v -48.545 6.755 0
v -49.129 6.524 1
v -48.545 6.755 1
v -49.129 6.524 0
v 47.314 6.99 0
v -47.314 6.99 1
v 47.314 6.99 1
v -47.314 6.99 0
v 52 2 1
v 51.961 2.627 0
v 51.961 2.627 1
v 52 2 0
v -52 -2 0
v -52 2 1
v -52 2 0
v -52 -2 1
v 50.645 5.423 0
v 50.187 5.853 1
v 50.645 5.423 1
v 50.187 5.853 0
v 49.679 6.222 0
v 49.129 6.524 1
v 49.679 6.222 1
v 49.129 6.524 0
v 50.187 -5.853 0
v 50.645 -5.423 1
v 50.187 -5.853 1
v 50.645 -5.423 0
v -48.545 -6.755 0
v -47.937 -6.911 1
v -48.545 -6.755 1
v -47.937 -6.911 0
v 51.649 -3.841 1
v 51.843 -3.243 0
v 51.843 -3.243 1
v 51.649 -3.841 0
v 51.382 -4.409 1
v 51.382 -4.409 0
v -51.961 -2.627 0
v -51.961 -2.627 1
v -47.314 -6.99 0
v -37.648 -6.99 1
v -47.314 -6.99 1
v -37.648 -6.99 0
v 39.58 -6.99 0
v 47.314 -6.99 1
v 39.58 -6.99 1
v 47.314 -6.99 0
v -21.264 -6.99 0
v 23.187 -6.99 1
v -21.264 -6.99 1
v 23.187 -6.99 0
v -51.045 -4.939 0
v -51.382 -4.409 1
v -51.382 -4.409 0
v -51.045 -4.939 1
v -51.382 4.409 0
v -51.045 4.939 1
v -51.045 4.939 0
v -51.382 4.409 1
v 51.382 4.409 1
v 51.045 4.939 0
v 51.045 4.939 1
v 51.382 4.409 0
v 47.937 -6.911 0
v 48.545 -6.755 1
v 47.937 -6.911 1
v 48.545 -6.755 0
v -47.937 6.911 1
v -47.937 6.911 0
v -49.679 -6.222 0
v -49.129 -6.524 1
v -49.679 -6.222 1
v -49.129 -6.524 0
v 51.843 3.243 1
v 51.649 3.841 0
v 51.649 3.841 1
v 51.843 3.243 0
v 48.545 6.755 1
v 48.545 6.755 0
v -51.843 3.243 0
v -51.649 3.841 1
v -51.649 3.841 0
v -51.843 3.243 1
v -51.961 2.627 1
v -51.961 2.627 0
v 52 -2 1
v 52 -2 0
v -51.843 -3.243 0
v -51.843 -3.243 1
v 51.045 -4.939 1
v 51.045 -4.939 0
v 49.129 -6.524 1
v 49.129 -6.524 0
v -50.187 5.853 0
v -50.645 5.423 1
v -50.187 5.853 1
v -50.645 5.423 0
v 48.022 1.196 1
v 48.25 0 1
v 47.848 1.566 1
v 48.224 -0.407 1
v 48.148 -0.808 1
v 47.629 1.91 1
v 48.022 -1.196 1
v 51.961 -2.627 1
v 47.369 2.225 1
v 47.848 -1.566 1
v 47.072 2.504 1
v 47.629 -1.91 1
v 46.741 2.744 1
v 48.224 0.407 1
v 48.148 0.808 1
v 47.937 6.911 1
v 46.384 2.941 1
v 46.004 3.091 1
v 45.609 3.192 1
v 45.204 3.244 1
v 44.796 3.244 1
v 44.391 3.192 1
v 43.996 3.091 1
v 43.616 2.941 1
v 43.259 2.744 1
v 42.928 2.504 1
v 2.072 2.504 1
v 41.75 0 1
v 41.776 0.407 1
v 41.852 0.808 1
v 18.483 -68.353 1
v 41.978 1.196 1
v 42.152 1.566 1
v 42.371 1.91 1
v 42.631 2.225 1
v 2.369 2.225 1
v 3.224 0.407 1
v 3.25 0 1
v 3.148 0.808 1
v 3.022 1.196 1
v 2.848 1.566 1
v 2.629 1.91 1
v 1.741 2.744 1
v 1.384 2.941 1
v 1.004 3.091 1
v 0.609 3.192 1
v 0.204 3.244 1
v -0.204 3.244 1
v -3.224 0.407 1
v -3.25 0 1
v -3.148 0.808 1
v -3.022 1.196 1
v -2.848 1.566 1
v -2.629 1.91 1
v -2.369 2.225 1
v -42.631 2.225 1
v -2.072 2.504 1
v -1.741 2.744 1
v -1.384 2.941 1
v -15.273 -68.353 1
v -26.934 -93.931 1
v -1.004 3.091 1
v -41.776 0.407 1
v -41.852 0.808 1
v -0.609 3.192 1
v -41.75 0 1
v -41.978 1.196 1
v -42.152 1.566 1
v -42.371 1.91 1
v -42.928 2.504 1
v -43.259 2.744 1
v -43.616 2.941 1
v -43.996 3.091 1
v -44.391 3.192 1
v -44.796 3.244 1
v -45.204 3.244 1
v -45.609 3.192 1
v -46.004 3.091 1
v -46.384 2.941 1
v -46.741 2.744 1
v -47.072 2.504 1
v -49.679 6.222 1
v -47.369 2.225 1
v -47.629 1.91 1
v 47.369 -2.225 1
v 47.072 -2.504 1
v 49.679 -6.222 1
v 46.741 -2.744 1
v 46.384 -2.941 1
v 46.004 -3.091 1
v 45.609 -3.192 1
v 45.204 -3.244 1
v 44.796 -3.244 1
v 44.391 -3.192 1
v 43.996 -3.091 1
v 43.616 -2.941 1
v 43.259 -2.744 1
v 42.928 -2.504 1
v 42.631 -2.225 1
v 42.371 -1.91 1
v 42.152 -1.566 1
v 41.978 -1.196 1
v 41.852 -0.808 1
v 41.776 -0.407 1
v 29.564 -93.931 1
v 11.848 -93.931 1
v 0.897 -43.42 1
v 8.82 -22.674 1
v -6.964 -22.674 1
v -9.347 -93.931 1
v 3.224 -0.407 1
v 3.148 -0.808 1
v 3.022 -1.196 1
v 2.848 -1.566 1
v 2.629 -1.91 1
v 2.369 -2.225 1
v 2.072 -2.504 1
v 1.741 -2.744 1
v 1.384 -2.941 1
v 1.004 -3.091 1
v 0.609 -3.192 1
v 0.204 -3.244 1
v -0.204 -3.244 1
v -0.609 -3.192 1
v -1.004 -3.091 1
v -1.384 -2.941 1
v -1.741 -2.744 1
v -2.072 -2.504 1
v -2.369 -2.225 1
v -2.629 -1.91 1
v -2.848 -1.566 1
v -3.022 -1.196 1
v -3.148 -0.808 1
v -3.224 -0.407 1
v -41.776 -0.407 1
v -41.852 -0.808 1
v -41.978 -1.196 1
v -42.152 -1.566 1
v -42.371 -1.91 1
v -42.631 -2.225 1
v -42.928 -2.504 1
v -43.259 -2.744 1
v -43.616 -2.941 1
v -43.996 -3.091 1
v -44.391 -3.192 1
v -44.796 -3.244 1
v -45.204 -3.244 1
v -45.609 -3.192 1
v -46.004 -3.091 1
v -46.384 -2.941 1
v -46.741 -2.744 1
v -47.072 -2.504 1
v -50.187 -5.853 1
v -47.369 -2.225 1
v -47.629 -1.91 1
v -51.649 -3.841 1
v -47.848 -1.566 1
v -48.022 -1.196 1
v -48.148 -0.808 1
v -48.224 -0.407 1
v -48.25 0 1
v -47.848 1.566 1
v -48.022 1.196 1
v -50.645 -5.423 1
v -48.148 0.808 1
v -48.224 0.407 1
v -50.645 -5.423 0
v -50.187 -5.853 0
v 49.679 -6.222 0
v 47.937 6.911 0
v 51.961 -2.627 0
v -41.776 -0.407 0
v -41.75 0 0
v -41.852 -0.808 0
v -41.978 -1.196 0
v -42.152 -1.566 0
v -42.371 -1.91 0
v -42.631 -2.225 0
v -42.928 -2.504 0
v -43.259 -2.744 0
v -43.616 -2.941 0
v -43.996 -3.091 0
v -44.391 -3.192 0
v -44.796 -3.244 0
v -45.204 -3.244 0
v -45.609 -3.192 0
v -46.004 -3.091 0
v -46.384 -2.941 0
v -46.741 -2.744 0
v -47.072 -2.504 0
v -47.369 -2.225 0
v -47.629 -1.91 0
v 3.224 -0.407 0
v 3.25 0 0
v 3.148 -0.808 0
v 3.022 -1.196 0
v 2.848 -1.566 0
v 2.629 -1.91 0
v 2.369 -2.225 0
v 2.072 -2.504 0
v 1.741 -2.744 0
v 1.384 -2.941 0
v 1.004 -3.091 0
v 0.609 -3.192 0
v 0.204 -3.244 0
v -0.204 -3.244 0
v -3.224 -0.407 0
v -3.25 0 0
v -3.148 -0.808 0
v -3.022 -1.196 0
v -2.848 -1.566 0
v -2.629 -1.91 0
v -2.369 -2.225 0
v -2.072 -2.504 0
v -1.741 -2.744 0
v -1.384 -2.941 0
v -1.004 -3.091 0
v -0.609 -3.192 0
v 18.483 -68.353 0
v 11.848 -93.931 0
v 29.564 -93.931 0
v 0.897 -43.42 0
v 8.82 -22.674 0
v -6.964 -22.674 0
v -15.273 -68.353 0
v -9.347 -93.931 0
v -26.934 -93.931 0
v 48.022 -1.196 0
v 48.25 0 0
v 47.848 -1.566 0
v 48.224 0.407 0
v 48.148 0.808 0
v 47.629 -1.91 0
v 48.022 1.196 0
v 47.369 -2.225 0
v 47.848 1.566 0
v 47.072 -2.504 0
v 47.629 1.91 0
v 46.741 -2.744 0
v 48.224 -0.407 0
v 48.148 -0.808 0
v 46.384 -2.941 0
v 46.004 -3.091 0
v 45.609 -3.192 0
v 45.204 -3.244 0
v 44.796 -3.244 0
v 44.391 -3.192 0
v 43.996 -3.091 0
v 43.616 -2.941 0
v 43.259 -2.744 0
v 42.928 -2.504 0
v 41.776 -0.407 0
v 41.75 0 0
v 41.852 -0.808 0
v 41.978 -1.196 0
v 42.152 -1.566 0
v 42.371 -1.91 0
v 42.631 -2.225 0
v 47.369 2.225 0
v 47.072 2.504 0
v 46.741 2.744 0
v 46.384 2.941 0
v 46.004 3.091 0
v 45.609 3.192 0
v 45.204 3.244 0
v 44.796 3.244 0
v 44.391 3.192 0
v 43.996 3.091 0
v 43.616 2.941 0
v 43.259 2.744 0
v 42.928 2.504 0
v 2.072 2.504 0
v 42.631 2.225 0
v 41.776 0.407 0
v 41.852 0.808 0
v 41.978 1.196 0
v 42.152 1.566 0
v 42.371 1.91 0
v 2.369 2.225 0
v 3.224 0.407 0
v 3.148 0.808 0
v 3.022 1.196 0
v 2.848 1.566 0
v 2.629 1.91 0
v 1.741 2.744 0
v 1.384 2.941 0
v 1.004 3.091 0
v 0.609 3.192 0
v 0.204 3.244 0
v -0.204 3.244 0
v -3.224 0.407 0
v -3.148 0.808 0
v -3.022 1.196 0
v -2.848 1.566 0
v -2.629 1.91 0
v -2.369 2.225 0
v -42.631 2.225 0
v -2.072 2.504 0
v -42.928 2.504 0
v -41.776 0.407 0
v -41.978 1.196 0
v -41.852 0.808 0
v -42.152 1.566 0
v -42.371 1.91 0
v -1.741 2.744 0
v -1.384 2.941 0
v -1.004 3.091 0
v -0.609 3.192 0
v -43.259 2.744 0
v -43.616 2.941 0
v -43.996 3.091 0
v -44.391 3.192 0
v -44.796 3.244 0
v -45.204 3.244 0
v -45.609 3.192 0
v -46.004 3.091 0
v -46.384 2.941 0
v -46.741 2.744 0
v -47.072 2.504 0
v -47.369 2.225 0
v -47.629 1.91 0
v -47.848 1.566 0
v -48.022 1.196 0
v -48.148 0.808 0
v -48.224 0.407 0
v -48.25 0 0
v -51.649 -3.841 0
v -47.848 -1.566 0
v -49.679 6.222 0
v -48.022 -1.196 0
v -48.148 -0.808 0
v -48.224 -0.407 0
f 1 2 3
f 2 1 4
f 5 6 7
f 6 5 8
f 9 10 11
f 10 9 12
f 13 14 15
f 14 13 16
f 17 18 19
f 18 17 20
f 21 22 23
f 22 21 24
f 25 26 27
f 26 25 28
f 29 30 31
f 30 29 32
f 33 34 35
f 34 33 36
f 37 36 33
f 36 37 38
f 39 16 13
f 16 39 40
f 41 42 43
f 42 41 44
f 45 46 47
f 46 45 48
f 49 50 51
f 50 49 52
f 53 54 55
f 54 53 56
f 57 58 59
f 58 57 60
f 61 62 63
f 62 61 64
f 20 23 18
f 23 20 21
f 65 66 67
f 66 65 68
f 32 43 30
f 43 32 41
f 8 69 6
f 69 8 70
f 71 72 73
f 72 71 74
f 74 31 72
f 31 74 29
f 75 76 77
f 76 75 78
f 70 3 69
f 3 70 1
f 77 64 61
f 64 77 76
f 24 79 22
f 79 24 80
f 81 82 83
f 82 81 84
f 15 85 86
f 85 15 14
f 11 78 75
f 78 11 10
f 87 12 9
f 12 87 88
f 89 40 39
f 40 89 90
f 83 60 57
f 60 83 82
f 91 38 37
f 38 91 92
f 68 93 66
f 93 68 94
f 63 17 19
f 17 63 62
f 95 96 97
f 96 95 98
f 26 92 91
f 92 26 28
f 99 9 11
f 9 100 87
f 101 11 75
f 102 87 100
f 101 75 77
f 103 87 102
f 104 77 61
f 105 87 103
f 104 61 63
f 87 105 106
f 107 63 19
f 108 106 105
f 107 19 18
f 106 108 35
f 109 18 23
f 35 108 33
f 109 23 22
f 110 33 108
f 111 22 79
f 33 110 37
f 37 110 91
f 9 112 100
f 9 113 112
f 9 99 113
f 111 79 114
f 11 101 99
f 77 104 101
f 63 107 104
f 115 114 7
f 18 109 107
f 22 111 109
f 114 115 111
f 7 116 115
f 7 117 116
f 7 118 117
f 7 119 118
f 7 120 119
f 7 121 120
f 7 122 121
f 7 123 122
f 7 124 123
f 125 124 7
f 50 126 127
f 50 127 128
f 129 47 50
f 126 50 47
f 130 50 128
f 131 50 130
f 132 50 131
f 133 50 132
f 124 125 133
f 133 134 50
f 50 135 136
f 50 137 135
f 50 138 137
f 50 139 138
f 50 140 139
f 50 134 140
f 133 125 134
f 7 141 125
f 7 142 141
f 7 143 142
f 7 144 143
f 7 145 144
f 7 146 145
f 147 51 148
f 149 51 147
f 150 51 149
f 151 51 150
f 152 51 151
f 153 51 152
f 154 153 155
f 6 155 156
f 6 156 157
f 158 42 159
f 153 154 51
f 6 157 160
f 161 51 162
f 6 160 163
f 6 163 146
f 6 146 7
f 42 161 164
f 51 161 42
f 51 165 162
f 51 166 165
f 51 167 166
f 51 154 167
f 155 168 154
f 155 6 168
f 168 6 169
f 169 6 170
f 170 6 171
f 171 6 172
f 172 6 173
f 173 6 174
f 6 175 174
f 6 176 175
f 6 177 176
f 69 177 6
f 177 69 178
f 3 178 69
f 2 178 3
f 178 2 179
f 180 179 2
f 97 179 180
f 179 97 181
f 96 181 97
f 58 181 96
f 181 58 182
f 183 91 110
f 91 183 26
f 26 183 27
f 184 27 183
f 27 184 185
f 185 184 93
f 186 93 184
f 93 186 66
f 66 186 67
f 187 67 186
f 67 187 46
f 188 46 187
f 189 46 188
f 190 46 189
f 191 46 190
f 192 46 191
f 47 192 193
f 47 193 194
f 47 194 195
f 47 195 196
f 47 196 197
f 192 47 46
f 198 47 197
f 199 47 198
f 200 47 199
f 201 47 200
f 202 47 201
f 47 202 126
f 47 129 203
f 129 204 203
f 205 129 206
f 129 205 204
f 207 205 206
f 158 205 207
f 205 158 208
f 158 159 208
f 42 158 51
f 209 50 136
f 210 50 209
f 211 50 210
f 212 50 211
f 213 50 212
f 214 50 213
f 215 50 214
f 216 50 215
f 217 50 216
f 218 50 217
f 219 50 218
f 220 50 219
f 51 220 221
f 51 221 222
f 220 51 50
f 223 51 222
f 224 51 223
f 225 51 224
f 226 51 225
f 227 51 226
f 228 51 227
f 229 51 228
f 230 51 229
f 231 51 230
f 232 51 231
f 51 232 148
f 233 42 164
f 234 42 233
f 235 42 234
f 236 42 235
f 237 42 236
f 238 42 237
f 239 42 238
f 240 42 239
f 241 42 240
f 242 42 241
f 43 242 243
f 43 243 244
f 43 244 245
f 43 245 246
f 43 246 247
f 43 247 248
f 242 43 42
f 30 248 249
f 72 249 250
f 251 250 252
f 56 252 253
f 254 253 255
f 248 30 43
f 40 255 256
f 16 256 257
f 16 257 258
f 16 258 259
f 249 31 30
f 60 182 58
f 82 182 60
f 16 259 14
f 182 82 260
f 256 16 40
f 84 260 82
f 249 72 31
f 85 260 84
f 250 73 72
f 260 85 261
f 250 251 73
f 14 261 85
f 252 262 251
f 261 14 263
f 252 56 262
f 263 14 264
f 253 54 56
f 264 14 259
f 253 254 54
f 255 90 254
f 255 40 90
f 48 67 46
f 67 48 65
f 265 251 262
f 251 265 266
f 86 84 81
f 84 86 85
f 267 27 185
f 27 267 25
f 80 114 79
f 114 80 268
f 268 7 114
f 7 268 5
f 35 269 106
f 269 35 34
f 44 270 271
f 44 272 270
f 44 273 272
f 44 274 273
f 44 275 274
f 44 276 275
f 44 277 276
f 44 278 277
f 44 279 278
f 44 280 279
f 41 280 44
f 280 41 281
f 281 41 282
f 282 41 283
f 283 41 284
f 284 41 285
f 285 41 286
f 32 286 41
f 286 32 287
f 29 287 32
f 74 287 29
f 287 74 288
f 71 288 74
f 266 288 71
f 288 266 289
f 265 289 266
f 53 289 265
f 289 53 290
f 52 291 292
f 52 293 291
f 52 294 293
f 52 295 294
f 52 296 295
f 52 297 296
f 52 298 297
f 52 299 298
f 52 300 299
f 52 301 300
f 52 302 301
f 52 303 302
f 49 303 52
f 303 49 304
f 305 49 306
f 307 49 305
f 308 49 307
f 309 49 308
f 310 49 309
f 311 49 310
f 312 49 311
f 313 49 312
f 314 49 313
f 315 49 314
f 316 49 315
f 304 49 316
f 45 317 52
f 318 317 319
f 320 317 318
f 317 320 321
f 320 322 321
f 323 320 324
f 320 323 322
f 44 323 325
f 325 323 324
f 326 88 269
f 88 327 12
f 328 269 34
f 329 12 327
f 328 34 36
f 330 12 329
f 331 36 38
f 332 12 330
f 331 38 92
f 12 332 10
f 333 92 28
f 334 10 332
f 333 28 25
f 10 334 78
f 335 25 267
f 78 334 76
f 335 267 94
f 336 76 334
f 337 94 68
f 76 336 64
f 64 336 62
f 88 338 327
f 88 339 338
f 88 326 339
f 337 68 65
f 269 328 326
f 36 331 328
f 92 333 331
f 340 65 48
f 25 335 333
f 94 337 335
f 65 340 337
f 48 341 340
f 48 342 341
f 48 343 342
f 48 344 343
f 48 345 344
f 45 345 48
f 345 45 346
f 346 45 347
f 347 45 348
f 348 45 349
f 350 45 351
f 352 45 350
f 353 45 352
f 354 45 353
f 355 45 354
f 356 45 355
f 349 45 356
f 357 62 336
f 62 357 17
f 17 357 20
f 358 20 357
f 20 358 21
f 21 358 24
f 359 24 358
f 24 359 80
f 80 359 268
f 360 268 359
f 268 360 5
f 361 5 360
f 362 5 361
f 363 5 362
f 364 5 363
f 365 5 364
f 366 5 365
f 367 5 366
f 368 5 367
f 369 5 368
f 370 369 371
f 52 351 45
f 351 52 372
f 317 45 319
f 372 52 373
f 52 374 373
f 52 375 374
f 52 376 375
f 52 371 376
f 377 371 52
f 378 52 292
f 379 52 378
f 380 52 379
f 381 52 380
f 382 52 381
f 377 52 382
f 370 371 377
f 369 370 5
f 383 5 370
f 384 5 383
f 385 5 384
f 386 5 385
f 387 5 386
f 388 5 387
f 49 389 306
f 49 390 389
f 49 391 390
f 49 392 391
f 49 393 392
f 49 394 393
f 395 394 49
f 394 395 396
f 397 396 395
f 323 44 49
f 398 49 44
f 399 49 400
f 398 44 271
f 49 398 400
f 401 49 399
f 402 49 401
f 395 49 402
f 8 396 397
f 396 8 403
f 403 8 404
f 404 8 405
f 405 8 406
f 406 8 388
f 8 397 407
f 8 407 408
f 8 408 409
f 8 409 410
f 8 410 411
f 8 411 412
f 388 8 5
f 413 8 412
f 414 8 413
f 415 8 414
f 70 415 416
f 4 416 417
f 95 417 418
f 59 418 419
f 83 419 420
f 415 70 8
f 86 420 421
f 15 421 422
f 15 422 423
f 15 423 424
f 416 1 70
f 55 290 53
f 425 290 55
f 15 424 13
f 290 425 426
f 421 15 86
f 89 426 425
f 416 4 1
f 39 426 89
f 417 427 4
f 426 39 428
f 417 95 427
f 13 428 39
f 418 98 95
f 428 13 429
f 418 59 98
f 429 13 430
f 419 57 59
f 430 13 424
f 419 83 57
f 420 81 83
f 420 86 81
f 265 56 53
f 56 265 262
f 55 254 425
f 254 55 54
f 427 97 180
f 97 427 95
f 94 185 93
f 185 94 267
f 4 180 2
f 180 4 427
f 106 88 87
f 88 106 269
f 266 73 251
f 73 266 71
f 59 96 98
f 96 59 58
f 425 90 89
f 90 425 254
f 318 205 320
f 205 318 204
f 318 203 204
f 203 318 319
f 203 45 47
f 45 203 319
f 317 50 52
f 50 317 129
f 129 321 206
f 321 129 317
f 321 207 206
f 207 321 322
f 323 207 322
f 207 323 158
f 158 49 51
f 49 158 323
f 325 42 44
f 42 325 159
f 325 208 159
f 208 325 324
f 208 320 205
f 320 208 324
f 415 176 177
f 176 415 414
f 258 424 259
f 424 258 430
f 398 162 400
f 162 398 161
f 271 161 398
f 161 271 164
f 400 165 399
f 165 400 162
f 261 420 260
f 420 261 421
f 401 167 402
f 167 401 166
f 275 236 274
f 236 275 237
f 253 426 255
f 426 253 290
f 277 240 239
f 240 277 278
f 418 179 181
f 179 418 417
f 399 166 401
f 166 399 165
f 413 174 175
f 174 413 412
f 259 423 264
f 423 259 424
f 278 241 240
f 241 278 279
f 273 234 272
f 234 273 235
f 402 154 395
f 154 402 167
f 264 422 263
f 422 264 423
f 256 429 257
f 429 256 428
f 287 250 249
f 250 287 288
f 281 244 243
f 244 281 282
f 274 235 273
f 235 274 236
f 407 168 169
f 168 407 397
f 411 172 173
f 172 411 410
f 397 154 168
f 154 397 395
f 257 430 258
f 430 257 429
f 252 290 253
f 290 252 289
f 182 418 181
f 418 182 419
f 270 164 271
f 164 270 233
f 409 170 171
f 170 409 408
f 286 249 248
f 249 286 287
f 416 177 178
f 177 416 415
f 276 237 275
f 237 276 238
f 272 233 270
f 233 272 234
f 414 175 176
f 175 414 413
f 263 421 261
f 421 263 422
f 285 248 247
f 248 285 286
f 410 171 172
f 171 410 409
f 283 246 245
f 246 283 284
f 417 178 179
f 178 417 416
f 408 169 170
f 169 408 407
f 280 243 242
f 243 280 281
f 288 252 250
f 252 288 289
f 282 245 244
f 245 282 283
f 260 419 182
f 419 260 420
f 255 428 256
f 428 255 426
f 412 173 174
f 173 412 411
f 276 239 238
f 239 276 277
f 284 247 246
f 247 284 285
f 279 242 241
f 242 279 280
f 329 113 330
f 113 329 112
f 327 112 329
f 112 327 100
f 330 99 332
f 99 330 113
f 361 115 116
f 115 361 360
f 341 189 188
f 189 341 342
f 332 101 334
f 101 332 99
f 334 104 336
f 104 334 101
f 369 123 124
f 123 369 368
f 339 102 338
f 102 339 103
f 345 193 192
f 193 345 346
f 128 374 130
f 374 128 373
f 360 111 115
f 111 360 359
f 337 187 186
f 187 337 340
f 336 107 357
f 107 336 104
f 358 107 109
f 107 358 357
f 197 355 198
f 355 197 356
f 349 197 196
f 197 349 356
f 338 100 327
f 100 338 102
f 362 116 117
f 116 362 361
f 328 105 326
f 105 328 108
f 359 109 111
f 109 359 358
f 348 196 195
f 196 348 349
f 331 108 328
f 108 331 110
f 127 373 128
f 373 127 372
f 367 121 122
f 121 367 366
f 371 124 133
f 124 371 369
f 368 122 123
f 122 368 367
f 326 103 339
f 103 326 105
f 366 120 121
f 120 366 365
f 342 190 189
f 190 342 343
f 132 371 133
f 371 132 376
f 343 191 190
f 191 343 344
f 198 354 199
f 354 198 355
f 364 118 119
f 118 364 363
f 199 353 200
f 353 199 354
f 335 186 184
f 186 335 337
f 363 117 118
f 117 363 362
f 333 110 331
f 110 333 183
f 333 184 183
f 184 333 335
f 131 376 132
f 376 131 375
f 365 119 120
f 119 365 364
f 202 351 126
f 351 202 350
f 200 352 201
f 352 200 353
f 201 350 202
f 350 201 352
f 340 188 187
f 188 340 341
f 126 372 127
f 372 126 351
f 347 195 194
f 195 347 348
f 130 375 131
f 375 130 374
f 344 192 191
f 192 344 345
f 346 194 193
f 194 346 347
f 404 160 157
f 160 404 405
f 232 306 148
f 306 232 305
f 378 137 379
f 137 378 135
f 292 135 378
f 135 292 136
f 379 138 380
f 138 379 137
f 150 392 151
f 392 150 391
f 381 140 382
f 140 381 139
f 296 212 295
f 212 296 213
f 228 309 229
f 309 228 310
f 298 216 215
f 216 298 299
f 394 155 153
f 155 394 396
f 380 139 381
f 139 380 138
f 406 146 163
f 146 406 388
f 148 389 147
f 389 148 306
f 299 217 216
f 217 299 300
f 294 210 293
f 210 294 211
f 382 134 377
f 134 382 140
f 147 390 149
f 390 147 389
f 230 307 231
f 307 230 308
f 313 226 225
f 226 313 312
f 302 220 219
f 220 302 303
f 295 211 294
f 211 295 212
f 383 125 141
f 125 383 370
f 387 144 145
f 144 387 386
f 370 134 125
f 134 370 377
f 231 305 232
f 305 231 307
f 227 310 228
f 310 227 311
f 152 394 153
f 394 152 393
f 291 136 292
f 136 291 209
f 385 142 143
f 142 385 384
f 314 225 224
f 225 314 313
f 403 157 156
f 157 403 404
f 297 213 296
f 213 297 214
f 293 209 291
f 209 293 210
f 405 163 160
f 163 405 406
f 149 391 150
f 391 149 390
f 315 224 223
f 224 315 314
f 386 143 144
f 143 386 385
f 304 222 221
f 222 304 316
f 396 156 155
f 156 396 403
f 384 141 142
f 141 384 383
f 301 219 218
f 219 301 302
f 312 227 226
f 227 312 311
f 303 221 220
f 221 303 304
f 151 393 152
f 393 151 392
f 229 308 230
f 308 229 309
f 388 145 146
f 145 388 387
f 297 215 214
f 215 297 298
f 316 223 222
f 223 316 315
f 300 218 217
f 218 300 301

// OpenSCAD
$fn = 50;


difference() {
	union() {
		translate(v = [0, 0, 0]) {
			rotate(a = [0, 0, 0]) {
				hull() {
					translate(v = [-47.0000000000, 2.0000000000, 0]) {
						rotate(a = [0, 0, 0]) {
							translate(v = [0, 0, 0]) {
								rotate(a = [0, 0, 0]) {
									cylinder(h = 1, r = 5);
								}
							}
						}
					}
					translate(v = [47.0000000000, 2.0000000000, 0]) {
						rotate(a = [0, 0, 0]) {
							translate(v = [0, 0, 0]) {
								rotate(a = [0, 0, 0]) {
									cylinder(h = 1, r = 5);
								}
							}
						}
					}
					translate(v = [-47.0000000000, -2.0000000000, 0]) {
						rotate(a = [0, 0, 0]) {
							translate(v = [0, 0, 0]) {
								rotate(a = [0, 0, 0]) {
									cylinder(h = 1, r = 5);
								}
							}
						}
					}
					translate(v = [47.0000000000, -2.0000000000, 0]) {
						rotate(a = [0, 0, 0]) {
							translate(v = [0, 0, 0]) {
								rotate(a = [0, 0, 0]) {
									cylinder(h = 1, r = 5);
								}
							}
						}
					}
				}
			}
		}
		translate(v = [0, 0, 0]) {
			rotate(a = [0, 0, 0]) {
				linear_extrude(height = 1) {
					text(font = "DejaVu Sans Mono:style=Bold", halign = "center", size = 95.0000000000, text = "W", valign = "top");
				}
			}
		}
	}
	union() {
		translate(v = [-45.0000000000, 0.0000000000, -125.0000000000]) {
			rotate(a = [0, 0, 0]) {
				cylinder(h = 250, r = 3.2500000000);
			}
		}
		translate(v = [45.0000000000, 0.0000000000, -125.0000000000]) {
			rotate(a = [0, 0, 0]) {
				cylinder(h = 250, r = 3.2500000000);
			}
		}
		translate(v = [45.0000000000, 0.0000000000, -125.0000000000]) {
			rotate(a = [0, 0, 0]) {
				cylinder(h = 250, r = 3.2500000000);
			}
		}
		translate(v = [0, 0, -125.0000000000]) {
			rotate(a = [0, 0, 0]) {
				cylinder(h = 250, r = 3.2500000000);
			}
		}
	}
}
